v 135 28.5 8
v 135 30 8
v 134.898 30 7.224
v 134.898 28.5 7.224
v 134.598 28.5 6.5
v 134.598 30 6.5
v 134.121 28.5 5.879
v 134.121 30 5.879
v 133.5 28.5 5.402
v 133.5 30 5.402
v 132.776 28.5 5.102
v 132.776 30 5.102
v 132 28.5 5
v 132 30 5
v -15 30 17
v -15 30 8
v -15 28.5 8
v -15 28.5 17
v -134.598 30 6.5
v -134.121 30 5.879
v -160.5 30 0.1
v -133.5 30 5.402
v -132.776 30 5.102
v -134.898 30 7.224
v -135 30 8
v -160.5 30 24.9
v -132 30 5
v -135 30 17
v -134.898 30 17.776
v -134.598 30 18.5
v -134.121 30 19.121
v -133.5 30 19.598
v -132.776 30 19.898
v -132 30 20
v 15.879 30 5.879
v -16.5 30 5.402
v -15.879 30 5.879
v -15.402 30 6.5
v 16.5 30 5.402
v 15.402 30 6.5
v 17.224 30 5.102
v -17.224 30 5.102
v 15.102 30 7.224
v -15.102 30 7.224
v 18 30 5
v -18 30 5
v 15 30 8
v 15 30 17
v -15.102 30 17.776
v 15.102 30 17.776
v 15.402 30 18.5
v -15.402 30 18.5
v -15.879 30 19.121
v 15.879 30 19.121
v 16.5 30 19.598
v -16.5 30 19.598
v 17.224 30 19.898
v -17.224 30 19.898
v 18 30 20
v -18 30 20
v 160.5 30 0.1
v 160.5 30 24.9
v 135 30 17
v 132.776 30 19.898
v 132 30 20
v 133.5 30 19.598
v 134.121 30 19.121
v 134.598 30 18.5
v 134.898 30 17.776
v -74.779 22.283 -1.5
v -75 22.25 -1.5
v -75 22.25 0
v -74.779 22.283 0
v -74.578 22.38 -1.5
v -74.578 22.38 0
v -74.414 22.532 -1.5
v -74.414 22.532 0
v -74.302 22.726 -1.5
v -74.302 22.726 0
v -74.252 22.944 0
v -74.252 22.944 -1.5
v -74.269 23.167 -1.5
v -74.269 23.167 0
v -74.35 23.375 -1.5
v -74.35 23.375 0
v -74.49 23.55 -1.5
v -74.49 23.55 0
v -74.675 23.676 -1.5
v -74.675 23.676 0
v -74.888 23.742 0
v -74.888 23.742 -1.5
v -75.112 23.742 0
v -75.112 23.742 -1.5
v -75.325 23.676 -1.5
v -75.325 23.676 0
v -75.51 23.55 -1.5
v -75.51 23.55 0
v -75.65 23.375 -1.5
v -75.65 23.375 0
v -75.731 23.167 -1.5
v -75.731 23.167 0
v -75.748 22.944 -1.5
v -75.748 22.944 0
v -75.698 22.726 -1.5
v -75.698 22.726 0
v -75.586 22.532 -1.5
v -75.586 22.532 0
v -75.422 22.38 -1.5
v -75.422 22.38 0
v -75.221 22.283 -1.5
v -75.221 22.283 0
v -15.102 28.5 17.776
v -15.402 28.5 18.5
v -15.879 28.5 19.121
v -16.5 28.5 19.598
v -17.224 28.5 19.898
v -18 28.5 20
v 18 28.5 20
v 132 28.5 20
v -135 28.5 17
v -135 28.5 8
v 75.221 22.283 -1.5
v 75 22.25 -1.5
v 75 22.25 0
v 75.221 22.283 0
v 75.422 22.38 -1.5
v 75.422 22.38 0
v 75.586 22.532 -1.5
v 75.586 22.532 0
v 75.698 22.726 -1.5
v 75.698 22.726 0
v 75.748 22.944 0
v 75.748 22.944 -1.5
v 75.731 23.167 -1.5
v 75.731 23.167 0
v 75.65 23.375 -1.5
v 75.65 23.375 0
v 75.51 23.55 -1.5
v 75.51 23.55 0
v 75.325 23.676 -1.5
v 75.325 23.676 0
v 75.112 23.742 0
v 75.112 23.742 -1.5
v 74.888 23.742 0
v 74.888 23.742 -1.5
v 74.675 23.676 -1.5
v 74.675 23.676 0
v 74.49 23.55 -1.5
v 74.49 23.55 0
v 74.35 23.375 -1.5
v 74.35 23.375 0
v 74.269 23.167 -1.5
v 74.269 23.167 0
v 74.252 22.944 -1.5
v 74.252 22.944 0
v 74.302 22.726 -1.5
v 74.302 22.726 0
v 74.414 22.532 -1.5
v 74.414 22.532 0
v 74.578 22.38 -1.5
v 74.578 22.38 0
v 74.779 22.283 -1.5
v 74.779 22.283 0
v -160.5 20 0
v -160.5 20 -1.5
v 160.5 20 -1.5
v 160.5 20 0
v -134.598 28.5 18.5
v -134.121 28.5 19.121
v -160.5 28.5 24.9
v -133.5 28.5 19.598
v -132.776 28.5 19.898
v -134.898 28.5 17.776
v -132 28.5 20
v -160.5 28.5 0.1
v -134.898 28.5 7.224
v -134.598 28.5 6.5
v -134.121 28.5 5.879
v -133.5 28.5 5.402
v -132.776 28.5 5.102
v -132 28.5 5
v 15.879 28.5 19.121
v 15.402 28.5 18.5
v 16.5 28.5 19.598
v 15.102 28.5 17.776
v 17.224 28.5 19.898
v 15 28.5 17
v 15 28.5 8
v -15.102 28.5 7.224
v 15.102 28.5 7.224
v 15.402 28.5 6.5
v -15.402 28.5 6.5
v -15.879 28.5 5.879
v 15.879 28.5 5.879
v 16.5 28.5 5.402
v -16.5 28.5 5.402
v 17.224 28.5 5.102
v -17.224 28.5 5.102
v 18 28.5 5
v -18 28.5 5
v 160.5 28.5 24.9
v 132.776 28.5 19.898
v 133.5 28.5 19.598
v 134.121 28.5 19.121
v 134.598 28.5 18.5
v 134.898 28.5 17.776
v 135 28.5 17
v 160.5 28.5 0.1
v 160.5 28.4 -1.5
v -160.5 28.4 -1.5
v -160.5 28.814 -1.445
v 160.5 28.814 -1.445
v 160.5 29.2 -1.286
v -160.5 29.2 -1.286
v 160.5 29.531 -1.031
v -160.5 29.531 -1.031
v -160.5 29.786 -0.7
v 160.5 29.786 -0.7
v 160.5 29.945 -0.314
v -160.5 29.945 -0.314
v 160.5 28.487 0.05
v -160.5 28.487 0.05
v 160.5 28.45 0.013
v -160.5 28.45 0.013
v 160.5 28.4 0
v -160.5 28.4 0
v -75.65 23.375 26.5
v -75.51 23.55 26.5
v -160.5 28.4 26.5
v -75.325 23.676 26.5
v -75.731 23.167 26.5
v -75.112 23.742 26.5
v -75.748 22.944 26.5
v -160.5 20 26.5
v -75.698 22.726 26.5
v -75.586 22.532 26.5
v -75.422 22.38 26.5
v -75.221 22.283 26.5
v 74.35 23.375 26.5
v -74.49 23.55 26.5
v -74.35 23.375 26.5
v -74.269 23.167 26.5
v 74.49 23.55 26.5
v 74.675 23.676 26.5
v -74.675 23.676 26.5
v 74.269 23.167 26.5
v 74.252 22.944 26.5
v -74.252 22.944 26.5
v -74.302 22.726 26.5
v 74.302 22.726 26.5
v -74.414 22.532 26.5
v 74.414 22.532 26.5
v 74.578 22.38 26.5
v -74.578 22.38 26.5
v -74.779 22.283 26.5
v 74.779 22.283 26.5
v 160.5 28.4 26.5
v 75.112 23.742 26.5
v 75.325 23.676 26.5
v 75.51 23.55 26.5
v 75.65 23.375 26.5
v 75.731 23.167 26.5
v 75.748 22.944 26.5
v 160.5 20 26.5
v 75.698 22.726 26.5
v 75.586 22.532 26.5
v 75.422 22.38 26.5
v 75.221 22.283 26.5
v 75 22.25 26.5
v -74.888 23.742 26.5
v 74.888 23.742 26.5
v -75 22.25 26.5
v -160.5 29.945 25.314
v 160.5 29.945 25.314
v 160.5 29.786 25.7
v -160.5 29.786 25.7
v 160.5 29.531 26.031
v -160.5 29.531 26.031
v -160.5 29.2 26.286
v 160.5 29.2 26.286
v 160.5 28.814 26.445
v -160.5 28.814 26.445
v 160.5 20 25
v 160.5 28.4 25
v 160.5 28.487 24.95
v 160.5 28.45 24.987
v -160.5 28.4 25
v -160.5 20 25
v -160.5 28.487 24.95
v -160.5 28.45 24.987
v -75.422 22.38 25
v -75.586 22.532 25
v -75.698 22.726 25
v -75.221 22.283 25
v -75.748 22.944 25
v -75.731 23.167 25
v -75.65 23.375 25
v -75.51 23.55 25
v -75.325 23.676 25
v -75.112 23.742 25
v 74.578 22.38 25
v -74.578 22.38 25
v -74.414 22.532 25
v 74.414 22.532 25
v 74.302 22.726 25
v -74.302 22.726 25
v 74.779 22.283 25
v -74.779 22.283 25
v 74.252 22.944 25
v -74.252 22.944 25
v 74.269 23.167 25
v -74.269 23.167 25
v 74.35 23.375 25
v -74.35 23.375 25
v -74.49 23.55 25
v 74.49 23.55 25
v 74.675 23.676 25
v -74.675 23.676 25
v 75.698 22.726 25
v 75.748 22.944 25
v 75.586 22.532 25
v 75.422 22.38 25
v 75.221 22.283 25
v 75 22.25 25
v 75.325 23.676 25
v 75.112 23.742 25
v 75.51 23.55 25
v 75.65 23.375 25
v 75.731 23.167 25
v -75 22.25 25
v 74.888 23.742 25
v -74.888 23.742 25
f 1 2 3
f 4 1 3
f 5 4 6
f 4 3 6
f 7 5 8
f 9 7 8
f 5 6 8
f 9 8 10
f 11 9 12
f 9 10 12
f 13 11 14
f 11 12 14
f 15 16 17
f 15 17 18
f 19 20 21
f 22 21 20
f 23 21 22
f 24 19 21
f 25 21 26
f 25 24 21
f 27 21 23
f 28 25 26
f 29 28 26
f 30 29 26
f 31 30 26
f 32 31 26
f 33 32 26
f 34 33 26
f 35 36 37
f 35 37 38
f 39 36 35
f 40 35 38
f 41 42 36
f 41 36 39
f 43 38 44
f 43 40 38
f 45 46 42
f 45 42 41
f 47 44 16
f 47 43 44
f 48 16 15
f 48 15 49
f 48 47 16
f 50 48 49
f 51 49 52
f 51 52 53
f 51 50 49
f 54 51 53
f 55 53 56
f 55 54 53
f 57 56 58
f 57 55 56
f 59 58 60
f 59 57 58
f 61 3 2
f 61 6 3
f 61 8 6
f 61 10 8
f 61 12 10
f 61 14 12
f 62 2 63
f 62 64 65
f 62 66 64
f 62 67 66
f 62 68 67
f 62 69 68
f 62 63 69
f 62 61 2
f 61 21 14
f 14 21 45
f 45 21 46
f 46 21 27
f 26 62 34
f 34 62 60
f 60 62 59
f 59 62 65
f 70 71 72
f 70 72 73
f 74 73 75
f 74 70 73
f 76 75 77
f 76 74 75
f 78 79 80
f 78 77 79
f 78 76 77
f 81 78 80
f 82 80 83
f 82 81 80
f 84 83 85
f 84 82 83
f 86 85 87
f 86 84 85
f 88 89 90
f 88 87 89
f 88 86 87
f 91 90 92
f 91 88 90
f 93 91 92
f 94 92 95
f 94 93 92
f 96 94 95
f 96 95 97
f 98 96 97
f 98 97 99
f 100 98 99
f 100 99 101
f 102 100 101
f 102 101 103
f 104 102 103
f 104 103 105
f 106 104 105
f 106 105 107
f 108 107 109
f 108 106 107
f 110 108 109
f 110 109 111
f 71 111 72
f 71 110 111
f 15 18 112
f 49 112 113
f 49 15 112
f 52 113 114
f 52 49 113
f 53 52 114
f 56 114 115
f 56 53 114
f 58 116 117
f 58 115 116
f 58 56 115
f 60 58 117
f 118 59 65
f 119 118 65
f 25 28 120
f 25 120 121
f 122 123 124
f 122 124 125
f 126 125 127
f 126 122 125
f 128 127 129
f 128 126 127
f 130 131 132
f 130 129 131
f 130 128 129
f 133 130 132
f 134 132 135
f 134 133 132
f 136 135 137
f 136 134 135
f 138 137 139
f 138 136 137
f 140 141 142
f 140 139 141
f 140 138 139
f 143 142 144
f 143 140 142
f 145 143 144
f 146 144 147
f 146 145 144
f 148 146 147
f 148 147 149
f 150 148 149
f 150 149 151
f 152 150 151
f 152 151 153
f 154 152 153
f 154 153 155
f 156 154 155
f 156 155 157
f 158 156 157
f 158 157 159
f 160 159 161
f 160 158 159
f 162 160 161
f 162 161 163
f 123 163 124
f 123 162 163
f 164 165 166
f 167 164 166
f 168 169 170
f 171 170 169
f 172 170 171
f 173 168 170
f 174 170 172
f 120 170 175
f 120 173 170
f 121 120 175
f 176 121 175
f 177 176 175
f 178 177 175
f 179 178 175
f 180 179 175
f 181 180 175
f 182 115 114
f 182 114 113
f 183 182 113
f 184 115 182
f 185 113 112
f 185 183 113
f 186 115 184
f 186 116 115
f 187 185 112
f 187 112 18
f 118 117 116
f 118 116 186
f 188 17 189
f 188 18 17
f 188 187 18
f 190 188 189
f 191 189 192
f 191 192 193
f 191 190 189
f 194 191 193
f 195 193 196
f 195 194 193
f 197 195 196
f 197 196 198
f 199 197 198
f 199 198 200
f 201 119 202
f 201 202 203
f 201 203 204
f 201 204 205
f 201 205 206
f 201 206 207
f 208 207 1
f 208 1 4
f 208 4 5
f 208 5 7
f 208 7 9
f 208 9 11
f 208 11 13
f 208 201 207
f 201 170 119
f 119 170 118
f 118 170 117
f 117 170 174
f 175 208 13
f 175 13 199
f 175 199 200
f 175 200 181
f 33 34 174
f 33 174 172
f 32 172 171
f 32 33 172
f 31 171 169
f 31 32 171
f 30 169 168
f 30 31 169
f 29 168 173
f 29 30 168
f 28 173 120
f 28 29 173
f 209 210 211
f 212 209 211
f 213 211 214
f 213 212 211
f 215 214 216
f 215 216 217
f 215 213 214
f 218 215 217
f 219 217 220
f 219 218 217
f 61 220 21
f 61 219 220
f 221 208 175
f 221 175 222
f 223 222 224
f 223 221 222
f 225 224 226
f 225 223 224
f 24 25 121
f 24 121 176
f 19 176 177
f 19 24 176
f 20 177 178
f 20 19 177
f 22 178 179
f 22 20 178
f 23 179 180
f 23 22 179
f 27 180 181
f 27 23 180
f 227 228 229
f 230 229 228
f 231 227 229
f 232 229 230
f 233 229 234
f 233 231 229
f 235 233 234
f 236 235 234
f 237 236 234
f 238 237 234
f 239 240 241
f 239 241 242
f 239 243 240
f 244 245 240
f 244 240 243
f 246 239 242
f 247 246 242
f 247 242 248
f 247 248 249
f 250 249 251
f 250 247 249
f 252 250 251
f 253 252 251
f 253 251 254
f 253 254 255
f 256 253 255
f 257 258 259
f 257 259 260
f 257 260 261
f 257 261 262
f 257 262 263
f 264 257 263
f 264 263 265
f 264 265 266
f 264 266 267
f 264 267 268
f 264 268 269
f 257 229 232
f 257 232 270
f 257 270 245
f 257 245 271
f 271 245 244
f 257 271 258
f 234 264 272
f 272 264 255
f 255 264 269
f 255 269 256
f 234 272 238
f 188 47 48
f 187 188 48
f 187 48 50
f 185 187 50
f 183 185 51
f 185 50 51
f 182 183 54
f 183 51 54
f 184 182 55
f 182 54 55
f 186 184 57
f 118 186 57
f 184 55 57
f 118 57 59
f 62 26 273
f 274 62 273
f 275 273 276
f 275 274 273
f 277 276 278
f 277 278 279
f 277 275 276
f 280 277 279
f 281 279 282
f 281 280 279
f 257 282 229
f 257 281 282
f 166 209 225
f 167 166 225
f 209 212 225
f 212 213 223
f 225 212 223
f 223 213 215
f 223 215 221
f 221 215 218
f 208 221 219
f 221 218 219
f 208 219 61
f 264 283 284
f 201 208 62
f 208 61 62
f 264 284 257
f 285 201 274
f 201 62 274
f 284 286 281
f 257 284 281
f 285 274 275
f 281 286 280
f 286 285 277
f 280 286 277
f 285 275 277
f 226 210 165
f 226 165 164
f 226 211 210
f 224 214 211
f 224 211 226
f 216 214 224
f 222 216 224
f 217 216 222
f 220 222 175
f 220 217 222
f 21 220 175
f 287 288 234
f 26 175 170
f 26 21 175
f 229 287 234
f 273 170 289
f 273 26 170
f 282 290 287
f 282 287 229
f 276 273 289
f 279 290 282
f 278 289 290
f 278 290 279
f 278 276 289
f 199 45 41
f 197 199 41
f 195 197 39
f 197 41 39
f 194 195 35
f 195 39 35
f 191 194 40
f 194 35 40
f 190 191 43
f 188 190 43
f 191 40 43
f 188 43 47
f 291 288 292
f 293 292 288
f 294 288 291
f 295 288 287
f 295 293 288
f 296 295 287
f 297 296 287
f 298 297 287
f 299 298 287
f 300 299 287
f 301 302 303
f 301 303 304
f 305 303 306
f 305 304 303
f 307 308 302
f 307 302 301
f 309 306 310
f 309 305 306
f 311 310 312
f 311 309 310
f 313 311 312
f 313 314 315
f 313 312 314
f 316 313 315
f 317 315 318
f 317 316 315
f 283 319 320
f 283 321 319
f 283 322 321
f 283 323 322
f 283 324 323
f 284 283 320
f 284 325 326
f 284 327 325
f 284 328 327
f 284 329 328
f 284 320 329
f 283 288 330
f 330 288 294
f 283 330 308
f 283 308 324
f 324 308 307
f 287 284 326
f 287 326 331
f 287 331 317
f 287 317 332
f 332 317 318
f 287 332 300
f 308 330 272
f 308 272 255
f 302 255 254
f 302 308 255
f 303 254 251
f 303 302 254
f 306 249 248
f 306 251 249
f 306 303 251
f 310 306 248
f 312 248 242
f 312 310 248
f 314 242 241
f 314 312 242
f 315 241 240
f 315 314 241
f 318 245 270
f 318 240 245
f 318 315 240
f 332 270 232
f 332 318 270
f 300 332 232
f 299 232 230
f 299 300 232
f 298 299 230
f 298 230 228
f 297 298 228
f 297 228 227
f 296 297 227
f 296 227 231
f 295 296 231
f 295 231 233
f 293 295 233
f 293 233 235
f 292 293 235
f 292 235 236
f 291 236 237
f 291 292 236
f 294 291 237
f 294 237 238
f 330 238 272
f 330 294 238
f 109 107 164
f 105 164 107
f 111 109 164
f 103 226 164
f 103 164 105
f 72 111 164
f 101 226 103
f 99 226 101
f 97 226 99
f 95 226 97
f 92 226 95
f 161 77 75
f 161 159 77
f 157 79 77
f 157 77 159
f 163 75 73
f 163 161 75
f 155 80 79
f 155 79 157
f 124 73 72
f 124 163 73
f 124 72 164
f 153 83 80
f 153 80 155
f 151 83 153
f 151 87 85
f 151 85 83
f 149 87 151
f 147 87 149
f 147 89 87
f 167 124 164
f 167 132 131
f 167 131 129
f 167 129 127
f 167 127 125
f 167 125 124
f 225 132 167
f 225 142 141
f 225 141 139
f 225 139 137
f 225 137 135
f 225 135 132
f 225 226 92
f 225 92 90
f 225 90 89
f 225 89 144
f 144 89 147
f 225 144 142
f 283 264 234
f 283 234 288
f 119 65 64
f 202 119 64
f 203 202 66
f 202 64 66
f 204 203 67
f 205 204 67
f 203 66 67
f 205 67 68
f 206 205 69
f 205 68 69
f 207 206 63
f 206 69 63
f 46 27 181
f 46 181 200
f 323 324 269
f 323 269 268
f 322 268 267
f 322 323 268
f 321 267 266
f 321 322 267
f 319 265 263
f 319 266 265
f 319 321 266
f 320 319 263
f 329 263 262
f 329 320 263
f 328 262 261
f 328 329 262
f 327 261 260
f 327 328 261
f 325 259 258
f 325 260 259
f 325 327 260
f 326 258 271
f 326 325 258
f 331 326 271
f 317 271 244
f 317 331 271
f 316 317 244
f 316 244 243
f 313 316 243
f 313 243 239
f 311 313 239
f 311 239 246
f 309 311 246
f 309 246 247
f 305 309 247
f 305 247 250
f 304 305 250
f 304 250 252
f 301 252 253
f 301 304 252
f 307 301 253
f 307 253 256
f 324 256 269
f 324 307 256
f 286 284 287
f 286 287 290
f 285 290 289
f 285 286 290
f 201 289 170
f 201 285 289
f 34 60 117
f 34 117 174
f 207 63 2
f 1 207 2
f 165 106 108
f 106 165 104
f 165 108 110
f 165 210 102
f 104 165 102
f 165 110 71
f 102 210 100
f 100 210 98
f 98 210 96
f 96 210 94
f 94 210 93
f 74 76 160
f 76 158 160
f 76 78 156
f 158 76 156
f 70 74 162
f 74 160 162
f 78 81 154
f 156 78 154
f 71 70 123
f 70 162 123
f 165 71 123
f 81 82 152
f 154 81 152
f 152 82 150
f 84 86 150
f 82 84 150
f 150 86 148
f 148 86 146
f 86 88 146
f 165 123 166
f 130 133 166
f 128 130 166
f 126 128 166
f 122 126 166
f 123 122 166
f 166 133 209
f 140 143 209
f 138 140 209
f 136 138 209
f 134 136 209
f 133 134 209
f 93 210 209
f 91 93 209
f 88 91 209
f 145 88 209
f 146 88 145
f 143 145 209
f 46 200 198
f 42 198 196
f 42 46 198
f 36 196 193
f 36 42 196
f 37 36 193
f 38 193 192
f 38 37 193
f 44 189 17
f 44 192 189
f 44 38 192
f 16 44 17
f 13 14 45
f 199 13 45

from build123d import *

# Parameters (mm, degrees)
SKETCH_1_W                         = 321
SKETCH_1_H                         = 60
SM_BASE_FLANGE_1_DEPTH             = 1.5
SM_EDGE_FLANGE_1_STRIP_W           = 6.2
SM_EDGE_FLANGE_1_STRIP_H           = 1.5
SM_EDGE_FLANGE_1_STRIP_CUT_DEPTH   = 321
SM_EDGE_FLANGE_1_STRIP_2_W         = 6.2
SM_EDGE_FLANGE_1_STRIP_2_H         = 1.5
SM_EDGE_FLANGE_1_STRIP_CUT_2_DEPTH = 321
SM_EDGE_FLANGE_1_DEPTH             = 321
SM_EDGE_FLANGE_1_BEND_DEPTH        = 321
SM_EDGE_FLANGE_2_STRIP_W           = 6.2
SM_EDGE_FLANGE_2_STRIP_H           = 1.5
SM_EDGE_FLANGE_2_STRIP_CUT_DEPTH   = 321
SM_EDGE_FLANGE_2_STRIP_2_W         = 6.2
SM_EDGE_FLANGE_2_STRIP_2_H         = 1.5
SM_EDGE_FLANGE_2_STRIP_CUT_2_DEPTH = 321
SM_EDGE_FLANGE_2_DEPTH             = 321
SM_EDGE_FLANGE_2_BEND_DEPTH        = 321
CUT_EXTRUDE_2_DEPTH                = 174.385408844
CUT_EXTRUDE_3_DEPTH                = 57
CUT_EXTRUDE_3_DEPTH_BACK           = 10
SKETCH_20_W                        = 341.087454661
SKETCH_20_H                        = 74.910603127
CUT_EXTRUDE_4_DEPTH                = 166.663061664
CUT_EXTRUDE_4_DEPTH_BACK           = 166.663061664
SKETCH_21_R                        = 0.75


# Sheet-metal steps are written as plain solids
with BuildPart() as part:
    # Sketch 1 → 基体-法兰1 (new body)
    with BuildSketch(Plane.XY):
        Rectangle(SKETCH_1_W, SKETCH_1_H)
    extrude(amount=-SM_BASE_FLANGE_1_DEPTH)

    # 边线-法兰1 strip (across the edge) → 边线-法兰1 strip cut (cut)
    with BuildSketch(Plane(origin=(160.5, 30, 0), x_dir=(0, -1, 0), z_dir=(-1, 0, 0))):
        with Locations((-1.5, -0.75)):
            Rectangle(SM_EDGE_FLANGE_1_STRIP_W, SM_EDGE_FLANGE_1_STRIP_H)
    extrude(amount=SM_EDGE_FLANGE_1_STRIP_CUT_DEPTH, mode=Mode.SUBTRACT)

    # 边线-法兰1 strip 2 (across the edge) → 边线-法兰1 strip cut 2 (cut)
    with BuildSketch(Plane(origin=(-160.5, -30, 0), x_dir=(0, 1, 0), z_dir=(1, 0, 0))):
        with Locations((-1.5, -0.75)):
            Rectangle(SM_EDGE_FLANGE_1_STRIP_2_W, SM_EDGE_FLANGE_1_STRIP_2_H)
    extrude(amount=SM_EDGE_FLANGE_1_STRIP_CUT_2_DEPTH, mode=Mode.SUBTRACT)

    # 边线-法兰1 section (across the edge) → 边线-法兰1 (add)
    with BuildSketch(Plane(origin=(160.5, 30, 0), x_dir=(0, -1, 0), z_dir=(-1, 0, 0))):
        with BuildLine():
            Line((0, 0.1), (0, 26.5))
            Line((0, 26.5), (1.5, 26.5))
            Line((1.5, 26.5), (1.5, 0.1))
            ThreePointArc((1.5, 0.1), (1.529289322, 0.029289322), (1.6, 0))
            Line((1.6, 0), (1.6, -1.5))
            ThreePointArc((1.6, -1.5), (0.46862915, -1.03137085), (0, 0.1))
        make_face()
    extrude(amount=SM_EDGE_FLANGE_1_DEPTH)

    # 边线-法兰1 section 2 (across the edge) → 边线-法兰1 bend (add)
    with BuildSketch(Plane(origin=(-160.5, -30, 0), x_dir=(0, 1, 0), z_dir=(1, 0, 0))):
        with BuildLine():
            Line((0, 0.1), (0, 26.5))
            Line((0, 26.5), (1.5, 26.5))
            Line((1.5, 26.5), (1.5, 0.1))
            ThreePointArc((1.5, 0.1), (1.529289322, 0.029289322), (1.6, 0))
            Line((1.6, 0), (1.6, -1.5))
            ThreePointArc((1.6, -1.5), (0.46862915, -1.03137085), (0, 0.1))
        make_face()
    extrude(amount=SM_EDGE_FLANGE_1_BEND_DEPTH)

    # 边线-法兰2 strip (across the edge) → 边线-法兰2 strip cut (cut)
    with BuildSketch(Plane(origin=(160.5, 28.5, 26.5), x_dir=(0, 0, -1), z_dir=(-1, 0, 0))):
        with Locations((-1.5, -0.75)):
            Rectangle(SM_EDGE_FLANGE_2_STRIP_W, SM_EDGE_FLANGE_2_STRIP_H)
    extrude(amount=SM_EDGE_FLANGE_2_STRIP_CUT_DEPTH, mode=Mode.SUBTRACT)

    # 边线-法兰2 strip 2 (across the edge) → 边线-法兰2 strip cut 2 (cut)
    with BuildSketch(Plane(origin=(-160.5, -28.5, 26.5), x_dir=(0, 0, -1), z_dir=(1, 0, 0))):
        with Locations((-1.5, -0.75)):
            Rectangle(SM_EDGE_FLANGE_2_STRIP_2_W, SM_EDGE_FLANGE_2_STRIP_2_H)
    extrude(amount=SM_EDGE_FLANGE_2_STRIP_CUT_2_DEPTH, mode=Mode.SUBTRACT)

    # 边线-法兰2 section (across the edge) → 边线-法兰2 (add)
    with BuildSketch(Plane(origin=(160.5, 28.5, 26.5), x_dir=(0, 0, -1), z_dir=(-1, 0, 0))):
        with BuildLine():
            Line((0, 0.1), (0, 8.5))
            Line((0, 8.5), (1.5, 8.5))
            Line((1.5, 8.5), (1.5, 0.1))
            ThreePointArc((1.5, 0.1), (1.529289322, 0.029289322), (1.6, 0))
            Line((1.6, 0), (1.6, -1.5))
            ThreePointArc((1.6, -1.5), (0.46862915, -1.03137085), (0, 0.1))
        make_face()
    extrude(amount=SM_EDGE_FLANGE_2_DEPTH)

    # 边线-法兰2 section 2 (across the edge) → 边线-法兰2 bend (add)
    with BuildSketch(Plane(origin=(-160.5, -28.5, 26.5), x_dir=(0, 0, -1), z_dir=(1, 0, 0))):
        with BuildLine():
            Line((0, 0.1), (0, 8.5))
            Line((0, 8.5), (1.5, 8.5))
            Line((1.5, 8.5), (1.5, 0.1))
            ThreePointArc((1.5, 0.1), (1.529289322, 0.029289322), (1.6, 0))
            Line((1.6, 0), (1.6, -1.5))
            ThreePointArc((1.6, -1.5), (0.46862915, -1.03137085), (0, 0.1))
        make_face()
    extrude(amount=SM_EDGE_FLANGE_2_BEND_DEPTH)

    # 草图19 → 切除-拉伸2 (cut, through all)
    with BuildSketch(Plane(origin=(0, 30, 0), x_dir=(1, 0, 0), z_dir=(0, 1, 0))):
        with BuildLine():
            Line((-132, -5), (-18, -5))
            ThreePointArc((-18, -5), (-15.878679656, -5.878679656), (-15, -8))
            Line((-15, -8), (-15, -17))
            ThreePointArc((-15, -17), (-15.878679656, -19.121320344), (-18, -20))
            Line((-18, -20), (-132, -20))
            ThreePointArc((-132, -20), (-134.121320344, -19.121320344), (-135, -17))
            Line((-135, -17), (-135, -8))
            ThreePointArc((-135, -8), (-134.121320344, -5.878679656), (-132, -5))
        make_face()
    cut_extrude_2 = extrude(amount=-CUT_EXTRUDE_2_DEPTH, mode=Mode.SUBTRACT)

    # 镜向1: 切除-拉伸2 across plane
    add(cut_extrude_2.mirror(Plane(origin=(0, 0, 0), x_dir=(0, 0, 1), z_dir=(1, 0, 0))), mode=Mode.SUBTRACT)

    # 草图20 → 切除-拉伸3 (cut, two sides: drawn at the far end of the back side and taken through both)
    with BuildSketch(Plane.XY.offset(-CUT_EXTRUDE_3_DEPTH_BACK)):
        with Locations((-10.043727331, -17.455301564)):
            Rectangle(SKETCH_20_W, SKETCH_20_H)
    extrude(amount=CUT_EXTRUDE_3_DEPTH + CUT_EXTRUDE_3_DEPTH_BACK, mode=Mode.SUBTRACT)

    # 草图21 → 切除-拉伸4 (cut, two sides: drawn at the far end of the back side and taken through both)
    with BuildSketch(Plane.XY.offset(26.5).offset(-CUT_EXTRUDE_4_DEPTH_BACK)):
        with Locations(Location((75, 23, 0), (0, 0, 270))):
            Circle(SKETCH_21_R)
        with Locations(Location((-75, 23, 0), (0, 0, 270))):
            Circle(SKETCH_21_R)
    extrude(amount=CUT_EXTRUDE_4_DEPTH + CUT_EXTRUDE_4_DEPTH_BACK, mode=Mode.SUBTRACT)


solid = part.part
